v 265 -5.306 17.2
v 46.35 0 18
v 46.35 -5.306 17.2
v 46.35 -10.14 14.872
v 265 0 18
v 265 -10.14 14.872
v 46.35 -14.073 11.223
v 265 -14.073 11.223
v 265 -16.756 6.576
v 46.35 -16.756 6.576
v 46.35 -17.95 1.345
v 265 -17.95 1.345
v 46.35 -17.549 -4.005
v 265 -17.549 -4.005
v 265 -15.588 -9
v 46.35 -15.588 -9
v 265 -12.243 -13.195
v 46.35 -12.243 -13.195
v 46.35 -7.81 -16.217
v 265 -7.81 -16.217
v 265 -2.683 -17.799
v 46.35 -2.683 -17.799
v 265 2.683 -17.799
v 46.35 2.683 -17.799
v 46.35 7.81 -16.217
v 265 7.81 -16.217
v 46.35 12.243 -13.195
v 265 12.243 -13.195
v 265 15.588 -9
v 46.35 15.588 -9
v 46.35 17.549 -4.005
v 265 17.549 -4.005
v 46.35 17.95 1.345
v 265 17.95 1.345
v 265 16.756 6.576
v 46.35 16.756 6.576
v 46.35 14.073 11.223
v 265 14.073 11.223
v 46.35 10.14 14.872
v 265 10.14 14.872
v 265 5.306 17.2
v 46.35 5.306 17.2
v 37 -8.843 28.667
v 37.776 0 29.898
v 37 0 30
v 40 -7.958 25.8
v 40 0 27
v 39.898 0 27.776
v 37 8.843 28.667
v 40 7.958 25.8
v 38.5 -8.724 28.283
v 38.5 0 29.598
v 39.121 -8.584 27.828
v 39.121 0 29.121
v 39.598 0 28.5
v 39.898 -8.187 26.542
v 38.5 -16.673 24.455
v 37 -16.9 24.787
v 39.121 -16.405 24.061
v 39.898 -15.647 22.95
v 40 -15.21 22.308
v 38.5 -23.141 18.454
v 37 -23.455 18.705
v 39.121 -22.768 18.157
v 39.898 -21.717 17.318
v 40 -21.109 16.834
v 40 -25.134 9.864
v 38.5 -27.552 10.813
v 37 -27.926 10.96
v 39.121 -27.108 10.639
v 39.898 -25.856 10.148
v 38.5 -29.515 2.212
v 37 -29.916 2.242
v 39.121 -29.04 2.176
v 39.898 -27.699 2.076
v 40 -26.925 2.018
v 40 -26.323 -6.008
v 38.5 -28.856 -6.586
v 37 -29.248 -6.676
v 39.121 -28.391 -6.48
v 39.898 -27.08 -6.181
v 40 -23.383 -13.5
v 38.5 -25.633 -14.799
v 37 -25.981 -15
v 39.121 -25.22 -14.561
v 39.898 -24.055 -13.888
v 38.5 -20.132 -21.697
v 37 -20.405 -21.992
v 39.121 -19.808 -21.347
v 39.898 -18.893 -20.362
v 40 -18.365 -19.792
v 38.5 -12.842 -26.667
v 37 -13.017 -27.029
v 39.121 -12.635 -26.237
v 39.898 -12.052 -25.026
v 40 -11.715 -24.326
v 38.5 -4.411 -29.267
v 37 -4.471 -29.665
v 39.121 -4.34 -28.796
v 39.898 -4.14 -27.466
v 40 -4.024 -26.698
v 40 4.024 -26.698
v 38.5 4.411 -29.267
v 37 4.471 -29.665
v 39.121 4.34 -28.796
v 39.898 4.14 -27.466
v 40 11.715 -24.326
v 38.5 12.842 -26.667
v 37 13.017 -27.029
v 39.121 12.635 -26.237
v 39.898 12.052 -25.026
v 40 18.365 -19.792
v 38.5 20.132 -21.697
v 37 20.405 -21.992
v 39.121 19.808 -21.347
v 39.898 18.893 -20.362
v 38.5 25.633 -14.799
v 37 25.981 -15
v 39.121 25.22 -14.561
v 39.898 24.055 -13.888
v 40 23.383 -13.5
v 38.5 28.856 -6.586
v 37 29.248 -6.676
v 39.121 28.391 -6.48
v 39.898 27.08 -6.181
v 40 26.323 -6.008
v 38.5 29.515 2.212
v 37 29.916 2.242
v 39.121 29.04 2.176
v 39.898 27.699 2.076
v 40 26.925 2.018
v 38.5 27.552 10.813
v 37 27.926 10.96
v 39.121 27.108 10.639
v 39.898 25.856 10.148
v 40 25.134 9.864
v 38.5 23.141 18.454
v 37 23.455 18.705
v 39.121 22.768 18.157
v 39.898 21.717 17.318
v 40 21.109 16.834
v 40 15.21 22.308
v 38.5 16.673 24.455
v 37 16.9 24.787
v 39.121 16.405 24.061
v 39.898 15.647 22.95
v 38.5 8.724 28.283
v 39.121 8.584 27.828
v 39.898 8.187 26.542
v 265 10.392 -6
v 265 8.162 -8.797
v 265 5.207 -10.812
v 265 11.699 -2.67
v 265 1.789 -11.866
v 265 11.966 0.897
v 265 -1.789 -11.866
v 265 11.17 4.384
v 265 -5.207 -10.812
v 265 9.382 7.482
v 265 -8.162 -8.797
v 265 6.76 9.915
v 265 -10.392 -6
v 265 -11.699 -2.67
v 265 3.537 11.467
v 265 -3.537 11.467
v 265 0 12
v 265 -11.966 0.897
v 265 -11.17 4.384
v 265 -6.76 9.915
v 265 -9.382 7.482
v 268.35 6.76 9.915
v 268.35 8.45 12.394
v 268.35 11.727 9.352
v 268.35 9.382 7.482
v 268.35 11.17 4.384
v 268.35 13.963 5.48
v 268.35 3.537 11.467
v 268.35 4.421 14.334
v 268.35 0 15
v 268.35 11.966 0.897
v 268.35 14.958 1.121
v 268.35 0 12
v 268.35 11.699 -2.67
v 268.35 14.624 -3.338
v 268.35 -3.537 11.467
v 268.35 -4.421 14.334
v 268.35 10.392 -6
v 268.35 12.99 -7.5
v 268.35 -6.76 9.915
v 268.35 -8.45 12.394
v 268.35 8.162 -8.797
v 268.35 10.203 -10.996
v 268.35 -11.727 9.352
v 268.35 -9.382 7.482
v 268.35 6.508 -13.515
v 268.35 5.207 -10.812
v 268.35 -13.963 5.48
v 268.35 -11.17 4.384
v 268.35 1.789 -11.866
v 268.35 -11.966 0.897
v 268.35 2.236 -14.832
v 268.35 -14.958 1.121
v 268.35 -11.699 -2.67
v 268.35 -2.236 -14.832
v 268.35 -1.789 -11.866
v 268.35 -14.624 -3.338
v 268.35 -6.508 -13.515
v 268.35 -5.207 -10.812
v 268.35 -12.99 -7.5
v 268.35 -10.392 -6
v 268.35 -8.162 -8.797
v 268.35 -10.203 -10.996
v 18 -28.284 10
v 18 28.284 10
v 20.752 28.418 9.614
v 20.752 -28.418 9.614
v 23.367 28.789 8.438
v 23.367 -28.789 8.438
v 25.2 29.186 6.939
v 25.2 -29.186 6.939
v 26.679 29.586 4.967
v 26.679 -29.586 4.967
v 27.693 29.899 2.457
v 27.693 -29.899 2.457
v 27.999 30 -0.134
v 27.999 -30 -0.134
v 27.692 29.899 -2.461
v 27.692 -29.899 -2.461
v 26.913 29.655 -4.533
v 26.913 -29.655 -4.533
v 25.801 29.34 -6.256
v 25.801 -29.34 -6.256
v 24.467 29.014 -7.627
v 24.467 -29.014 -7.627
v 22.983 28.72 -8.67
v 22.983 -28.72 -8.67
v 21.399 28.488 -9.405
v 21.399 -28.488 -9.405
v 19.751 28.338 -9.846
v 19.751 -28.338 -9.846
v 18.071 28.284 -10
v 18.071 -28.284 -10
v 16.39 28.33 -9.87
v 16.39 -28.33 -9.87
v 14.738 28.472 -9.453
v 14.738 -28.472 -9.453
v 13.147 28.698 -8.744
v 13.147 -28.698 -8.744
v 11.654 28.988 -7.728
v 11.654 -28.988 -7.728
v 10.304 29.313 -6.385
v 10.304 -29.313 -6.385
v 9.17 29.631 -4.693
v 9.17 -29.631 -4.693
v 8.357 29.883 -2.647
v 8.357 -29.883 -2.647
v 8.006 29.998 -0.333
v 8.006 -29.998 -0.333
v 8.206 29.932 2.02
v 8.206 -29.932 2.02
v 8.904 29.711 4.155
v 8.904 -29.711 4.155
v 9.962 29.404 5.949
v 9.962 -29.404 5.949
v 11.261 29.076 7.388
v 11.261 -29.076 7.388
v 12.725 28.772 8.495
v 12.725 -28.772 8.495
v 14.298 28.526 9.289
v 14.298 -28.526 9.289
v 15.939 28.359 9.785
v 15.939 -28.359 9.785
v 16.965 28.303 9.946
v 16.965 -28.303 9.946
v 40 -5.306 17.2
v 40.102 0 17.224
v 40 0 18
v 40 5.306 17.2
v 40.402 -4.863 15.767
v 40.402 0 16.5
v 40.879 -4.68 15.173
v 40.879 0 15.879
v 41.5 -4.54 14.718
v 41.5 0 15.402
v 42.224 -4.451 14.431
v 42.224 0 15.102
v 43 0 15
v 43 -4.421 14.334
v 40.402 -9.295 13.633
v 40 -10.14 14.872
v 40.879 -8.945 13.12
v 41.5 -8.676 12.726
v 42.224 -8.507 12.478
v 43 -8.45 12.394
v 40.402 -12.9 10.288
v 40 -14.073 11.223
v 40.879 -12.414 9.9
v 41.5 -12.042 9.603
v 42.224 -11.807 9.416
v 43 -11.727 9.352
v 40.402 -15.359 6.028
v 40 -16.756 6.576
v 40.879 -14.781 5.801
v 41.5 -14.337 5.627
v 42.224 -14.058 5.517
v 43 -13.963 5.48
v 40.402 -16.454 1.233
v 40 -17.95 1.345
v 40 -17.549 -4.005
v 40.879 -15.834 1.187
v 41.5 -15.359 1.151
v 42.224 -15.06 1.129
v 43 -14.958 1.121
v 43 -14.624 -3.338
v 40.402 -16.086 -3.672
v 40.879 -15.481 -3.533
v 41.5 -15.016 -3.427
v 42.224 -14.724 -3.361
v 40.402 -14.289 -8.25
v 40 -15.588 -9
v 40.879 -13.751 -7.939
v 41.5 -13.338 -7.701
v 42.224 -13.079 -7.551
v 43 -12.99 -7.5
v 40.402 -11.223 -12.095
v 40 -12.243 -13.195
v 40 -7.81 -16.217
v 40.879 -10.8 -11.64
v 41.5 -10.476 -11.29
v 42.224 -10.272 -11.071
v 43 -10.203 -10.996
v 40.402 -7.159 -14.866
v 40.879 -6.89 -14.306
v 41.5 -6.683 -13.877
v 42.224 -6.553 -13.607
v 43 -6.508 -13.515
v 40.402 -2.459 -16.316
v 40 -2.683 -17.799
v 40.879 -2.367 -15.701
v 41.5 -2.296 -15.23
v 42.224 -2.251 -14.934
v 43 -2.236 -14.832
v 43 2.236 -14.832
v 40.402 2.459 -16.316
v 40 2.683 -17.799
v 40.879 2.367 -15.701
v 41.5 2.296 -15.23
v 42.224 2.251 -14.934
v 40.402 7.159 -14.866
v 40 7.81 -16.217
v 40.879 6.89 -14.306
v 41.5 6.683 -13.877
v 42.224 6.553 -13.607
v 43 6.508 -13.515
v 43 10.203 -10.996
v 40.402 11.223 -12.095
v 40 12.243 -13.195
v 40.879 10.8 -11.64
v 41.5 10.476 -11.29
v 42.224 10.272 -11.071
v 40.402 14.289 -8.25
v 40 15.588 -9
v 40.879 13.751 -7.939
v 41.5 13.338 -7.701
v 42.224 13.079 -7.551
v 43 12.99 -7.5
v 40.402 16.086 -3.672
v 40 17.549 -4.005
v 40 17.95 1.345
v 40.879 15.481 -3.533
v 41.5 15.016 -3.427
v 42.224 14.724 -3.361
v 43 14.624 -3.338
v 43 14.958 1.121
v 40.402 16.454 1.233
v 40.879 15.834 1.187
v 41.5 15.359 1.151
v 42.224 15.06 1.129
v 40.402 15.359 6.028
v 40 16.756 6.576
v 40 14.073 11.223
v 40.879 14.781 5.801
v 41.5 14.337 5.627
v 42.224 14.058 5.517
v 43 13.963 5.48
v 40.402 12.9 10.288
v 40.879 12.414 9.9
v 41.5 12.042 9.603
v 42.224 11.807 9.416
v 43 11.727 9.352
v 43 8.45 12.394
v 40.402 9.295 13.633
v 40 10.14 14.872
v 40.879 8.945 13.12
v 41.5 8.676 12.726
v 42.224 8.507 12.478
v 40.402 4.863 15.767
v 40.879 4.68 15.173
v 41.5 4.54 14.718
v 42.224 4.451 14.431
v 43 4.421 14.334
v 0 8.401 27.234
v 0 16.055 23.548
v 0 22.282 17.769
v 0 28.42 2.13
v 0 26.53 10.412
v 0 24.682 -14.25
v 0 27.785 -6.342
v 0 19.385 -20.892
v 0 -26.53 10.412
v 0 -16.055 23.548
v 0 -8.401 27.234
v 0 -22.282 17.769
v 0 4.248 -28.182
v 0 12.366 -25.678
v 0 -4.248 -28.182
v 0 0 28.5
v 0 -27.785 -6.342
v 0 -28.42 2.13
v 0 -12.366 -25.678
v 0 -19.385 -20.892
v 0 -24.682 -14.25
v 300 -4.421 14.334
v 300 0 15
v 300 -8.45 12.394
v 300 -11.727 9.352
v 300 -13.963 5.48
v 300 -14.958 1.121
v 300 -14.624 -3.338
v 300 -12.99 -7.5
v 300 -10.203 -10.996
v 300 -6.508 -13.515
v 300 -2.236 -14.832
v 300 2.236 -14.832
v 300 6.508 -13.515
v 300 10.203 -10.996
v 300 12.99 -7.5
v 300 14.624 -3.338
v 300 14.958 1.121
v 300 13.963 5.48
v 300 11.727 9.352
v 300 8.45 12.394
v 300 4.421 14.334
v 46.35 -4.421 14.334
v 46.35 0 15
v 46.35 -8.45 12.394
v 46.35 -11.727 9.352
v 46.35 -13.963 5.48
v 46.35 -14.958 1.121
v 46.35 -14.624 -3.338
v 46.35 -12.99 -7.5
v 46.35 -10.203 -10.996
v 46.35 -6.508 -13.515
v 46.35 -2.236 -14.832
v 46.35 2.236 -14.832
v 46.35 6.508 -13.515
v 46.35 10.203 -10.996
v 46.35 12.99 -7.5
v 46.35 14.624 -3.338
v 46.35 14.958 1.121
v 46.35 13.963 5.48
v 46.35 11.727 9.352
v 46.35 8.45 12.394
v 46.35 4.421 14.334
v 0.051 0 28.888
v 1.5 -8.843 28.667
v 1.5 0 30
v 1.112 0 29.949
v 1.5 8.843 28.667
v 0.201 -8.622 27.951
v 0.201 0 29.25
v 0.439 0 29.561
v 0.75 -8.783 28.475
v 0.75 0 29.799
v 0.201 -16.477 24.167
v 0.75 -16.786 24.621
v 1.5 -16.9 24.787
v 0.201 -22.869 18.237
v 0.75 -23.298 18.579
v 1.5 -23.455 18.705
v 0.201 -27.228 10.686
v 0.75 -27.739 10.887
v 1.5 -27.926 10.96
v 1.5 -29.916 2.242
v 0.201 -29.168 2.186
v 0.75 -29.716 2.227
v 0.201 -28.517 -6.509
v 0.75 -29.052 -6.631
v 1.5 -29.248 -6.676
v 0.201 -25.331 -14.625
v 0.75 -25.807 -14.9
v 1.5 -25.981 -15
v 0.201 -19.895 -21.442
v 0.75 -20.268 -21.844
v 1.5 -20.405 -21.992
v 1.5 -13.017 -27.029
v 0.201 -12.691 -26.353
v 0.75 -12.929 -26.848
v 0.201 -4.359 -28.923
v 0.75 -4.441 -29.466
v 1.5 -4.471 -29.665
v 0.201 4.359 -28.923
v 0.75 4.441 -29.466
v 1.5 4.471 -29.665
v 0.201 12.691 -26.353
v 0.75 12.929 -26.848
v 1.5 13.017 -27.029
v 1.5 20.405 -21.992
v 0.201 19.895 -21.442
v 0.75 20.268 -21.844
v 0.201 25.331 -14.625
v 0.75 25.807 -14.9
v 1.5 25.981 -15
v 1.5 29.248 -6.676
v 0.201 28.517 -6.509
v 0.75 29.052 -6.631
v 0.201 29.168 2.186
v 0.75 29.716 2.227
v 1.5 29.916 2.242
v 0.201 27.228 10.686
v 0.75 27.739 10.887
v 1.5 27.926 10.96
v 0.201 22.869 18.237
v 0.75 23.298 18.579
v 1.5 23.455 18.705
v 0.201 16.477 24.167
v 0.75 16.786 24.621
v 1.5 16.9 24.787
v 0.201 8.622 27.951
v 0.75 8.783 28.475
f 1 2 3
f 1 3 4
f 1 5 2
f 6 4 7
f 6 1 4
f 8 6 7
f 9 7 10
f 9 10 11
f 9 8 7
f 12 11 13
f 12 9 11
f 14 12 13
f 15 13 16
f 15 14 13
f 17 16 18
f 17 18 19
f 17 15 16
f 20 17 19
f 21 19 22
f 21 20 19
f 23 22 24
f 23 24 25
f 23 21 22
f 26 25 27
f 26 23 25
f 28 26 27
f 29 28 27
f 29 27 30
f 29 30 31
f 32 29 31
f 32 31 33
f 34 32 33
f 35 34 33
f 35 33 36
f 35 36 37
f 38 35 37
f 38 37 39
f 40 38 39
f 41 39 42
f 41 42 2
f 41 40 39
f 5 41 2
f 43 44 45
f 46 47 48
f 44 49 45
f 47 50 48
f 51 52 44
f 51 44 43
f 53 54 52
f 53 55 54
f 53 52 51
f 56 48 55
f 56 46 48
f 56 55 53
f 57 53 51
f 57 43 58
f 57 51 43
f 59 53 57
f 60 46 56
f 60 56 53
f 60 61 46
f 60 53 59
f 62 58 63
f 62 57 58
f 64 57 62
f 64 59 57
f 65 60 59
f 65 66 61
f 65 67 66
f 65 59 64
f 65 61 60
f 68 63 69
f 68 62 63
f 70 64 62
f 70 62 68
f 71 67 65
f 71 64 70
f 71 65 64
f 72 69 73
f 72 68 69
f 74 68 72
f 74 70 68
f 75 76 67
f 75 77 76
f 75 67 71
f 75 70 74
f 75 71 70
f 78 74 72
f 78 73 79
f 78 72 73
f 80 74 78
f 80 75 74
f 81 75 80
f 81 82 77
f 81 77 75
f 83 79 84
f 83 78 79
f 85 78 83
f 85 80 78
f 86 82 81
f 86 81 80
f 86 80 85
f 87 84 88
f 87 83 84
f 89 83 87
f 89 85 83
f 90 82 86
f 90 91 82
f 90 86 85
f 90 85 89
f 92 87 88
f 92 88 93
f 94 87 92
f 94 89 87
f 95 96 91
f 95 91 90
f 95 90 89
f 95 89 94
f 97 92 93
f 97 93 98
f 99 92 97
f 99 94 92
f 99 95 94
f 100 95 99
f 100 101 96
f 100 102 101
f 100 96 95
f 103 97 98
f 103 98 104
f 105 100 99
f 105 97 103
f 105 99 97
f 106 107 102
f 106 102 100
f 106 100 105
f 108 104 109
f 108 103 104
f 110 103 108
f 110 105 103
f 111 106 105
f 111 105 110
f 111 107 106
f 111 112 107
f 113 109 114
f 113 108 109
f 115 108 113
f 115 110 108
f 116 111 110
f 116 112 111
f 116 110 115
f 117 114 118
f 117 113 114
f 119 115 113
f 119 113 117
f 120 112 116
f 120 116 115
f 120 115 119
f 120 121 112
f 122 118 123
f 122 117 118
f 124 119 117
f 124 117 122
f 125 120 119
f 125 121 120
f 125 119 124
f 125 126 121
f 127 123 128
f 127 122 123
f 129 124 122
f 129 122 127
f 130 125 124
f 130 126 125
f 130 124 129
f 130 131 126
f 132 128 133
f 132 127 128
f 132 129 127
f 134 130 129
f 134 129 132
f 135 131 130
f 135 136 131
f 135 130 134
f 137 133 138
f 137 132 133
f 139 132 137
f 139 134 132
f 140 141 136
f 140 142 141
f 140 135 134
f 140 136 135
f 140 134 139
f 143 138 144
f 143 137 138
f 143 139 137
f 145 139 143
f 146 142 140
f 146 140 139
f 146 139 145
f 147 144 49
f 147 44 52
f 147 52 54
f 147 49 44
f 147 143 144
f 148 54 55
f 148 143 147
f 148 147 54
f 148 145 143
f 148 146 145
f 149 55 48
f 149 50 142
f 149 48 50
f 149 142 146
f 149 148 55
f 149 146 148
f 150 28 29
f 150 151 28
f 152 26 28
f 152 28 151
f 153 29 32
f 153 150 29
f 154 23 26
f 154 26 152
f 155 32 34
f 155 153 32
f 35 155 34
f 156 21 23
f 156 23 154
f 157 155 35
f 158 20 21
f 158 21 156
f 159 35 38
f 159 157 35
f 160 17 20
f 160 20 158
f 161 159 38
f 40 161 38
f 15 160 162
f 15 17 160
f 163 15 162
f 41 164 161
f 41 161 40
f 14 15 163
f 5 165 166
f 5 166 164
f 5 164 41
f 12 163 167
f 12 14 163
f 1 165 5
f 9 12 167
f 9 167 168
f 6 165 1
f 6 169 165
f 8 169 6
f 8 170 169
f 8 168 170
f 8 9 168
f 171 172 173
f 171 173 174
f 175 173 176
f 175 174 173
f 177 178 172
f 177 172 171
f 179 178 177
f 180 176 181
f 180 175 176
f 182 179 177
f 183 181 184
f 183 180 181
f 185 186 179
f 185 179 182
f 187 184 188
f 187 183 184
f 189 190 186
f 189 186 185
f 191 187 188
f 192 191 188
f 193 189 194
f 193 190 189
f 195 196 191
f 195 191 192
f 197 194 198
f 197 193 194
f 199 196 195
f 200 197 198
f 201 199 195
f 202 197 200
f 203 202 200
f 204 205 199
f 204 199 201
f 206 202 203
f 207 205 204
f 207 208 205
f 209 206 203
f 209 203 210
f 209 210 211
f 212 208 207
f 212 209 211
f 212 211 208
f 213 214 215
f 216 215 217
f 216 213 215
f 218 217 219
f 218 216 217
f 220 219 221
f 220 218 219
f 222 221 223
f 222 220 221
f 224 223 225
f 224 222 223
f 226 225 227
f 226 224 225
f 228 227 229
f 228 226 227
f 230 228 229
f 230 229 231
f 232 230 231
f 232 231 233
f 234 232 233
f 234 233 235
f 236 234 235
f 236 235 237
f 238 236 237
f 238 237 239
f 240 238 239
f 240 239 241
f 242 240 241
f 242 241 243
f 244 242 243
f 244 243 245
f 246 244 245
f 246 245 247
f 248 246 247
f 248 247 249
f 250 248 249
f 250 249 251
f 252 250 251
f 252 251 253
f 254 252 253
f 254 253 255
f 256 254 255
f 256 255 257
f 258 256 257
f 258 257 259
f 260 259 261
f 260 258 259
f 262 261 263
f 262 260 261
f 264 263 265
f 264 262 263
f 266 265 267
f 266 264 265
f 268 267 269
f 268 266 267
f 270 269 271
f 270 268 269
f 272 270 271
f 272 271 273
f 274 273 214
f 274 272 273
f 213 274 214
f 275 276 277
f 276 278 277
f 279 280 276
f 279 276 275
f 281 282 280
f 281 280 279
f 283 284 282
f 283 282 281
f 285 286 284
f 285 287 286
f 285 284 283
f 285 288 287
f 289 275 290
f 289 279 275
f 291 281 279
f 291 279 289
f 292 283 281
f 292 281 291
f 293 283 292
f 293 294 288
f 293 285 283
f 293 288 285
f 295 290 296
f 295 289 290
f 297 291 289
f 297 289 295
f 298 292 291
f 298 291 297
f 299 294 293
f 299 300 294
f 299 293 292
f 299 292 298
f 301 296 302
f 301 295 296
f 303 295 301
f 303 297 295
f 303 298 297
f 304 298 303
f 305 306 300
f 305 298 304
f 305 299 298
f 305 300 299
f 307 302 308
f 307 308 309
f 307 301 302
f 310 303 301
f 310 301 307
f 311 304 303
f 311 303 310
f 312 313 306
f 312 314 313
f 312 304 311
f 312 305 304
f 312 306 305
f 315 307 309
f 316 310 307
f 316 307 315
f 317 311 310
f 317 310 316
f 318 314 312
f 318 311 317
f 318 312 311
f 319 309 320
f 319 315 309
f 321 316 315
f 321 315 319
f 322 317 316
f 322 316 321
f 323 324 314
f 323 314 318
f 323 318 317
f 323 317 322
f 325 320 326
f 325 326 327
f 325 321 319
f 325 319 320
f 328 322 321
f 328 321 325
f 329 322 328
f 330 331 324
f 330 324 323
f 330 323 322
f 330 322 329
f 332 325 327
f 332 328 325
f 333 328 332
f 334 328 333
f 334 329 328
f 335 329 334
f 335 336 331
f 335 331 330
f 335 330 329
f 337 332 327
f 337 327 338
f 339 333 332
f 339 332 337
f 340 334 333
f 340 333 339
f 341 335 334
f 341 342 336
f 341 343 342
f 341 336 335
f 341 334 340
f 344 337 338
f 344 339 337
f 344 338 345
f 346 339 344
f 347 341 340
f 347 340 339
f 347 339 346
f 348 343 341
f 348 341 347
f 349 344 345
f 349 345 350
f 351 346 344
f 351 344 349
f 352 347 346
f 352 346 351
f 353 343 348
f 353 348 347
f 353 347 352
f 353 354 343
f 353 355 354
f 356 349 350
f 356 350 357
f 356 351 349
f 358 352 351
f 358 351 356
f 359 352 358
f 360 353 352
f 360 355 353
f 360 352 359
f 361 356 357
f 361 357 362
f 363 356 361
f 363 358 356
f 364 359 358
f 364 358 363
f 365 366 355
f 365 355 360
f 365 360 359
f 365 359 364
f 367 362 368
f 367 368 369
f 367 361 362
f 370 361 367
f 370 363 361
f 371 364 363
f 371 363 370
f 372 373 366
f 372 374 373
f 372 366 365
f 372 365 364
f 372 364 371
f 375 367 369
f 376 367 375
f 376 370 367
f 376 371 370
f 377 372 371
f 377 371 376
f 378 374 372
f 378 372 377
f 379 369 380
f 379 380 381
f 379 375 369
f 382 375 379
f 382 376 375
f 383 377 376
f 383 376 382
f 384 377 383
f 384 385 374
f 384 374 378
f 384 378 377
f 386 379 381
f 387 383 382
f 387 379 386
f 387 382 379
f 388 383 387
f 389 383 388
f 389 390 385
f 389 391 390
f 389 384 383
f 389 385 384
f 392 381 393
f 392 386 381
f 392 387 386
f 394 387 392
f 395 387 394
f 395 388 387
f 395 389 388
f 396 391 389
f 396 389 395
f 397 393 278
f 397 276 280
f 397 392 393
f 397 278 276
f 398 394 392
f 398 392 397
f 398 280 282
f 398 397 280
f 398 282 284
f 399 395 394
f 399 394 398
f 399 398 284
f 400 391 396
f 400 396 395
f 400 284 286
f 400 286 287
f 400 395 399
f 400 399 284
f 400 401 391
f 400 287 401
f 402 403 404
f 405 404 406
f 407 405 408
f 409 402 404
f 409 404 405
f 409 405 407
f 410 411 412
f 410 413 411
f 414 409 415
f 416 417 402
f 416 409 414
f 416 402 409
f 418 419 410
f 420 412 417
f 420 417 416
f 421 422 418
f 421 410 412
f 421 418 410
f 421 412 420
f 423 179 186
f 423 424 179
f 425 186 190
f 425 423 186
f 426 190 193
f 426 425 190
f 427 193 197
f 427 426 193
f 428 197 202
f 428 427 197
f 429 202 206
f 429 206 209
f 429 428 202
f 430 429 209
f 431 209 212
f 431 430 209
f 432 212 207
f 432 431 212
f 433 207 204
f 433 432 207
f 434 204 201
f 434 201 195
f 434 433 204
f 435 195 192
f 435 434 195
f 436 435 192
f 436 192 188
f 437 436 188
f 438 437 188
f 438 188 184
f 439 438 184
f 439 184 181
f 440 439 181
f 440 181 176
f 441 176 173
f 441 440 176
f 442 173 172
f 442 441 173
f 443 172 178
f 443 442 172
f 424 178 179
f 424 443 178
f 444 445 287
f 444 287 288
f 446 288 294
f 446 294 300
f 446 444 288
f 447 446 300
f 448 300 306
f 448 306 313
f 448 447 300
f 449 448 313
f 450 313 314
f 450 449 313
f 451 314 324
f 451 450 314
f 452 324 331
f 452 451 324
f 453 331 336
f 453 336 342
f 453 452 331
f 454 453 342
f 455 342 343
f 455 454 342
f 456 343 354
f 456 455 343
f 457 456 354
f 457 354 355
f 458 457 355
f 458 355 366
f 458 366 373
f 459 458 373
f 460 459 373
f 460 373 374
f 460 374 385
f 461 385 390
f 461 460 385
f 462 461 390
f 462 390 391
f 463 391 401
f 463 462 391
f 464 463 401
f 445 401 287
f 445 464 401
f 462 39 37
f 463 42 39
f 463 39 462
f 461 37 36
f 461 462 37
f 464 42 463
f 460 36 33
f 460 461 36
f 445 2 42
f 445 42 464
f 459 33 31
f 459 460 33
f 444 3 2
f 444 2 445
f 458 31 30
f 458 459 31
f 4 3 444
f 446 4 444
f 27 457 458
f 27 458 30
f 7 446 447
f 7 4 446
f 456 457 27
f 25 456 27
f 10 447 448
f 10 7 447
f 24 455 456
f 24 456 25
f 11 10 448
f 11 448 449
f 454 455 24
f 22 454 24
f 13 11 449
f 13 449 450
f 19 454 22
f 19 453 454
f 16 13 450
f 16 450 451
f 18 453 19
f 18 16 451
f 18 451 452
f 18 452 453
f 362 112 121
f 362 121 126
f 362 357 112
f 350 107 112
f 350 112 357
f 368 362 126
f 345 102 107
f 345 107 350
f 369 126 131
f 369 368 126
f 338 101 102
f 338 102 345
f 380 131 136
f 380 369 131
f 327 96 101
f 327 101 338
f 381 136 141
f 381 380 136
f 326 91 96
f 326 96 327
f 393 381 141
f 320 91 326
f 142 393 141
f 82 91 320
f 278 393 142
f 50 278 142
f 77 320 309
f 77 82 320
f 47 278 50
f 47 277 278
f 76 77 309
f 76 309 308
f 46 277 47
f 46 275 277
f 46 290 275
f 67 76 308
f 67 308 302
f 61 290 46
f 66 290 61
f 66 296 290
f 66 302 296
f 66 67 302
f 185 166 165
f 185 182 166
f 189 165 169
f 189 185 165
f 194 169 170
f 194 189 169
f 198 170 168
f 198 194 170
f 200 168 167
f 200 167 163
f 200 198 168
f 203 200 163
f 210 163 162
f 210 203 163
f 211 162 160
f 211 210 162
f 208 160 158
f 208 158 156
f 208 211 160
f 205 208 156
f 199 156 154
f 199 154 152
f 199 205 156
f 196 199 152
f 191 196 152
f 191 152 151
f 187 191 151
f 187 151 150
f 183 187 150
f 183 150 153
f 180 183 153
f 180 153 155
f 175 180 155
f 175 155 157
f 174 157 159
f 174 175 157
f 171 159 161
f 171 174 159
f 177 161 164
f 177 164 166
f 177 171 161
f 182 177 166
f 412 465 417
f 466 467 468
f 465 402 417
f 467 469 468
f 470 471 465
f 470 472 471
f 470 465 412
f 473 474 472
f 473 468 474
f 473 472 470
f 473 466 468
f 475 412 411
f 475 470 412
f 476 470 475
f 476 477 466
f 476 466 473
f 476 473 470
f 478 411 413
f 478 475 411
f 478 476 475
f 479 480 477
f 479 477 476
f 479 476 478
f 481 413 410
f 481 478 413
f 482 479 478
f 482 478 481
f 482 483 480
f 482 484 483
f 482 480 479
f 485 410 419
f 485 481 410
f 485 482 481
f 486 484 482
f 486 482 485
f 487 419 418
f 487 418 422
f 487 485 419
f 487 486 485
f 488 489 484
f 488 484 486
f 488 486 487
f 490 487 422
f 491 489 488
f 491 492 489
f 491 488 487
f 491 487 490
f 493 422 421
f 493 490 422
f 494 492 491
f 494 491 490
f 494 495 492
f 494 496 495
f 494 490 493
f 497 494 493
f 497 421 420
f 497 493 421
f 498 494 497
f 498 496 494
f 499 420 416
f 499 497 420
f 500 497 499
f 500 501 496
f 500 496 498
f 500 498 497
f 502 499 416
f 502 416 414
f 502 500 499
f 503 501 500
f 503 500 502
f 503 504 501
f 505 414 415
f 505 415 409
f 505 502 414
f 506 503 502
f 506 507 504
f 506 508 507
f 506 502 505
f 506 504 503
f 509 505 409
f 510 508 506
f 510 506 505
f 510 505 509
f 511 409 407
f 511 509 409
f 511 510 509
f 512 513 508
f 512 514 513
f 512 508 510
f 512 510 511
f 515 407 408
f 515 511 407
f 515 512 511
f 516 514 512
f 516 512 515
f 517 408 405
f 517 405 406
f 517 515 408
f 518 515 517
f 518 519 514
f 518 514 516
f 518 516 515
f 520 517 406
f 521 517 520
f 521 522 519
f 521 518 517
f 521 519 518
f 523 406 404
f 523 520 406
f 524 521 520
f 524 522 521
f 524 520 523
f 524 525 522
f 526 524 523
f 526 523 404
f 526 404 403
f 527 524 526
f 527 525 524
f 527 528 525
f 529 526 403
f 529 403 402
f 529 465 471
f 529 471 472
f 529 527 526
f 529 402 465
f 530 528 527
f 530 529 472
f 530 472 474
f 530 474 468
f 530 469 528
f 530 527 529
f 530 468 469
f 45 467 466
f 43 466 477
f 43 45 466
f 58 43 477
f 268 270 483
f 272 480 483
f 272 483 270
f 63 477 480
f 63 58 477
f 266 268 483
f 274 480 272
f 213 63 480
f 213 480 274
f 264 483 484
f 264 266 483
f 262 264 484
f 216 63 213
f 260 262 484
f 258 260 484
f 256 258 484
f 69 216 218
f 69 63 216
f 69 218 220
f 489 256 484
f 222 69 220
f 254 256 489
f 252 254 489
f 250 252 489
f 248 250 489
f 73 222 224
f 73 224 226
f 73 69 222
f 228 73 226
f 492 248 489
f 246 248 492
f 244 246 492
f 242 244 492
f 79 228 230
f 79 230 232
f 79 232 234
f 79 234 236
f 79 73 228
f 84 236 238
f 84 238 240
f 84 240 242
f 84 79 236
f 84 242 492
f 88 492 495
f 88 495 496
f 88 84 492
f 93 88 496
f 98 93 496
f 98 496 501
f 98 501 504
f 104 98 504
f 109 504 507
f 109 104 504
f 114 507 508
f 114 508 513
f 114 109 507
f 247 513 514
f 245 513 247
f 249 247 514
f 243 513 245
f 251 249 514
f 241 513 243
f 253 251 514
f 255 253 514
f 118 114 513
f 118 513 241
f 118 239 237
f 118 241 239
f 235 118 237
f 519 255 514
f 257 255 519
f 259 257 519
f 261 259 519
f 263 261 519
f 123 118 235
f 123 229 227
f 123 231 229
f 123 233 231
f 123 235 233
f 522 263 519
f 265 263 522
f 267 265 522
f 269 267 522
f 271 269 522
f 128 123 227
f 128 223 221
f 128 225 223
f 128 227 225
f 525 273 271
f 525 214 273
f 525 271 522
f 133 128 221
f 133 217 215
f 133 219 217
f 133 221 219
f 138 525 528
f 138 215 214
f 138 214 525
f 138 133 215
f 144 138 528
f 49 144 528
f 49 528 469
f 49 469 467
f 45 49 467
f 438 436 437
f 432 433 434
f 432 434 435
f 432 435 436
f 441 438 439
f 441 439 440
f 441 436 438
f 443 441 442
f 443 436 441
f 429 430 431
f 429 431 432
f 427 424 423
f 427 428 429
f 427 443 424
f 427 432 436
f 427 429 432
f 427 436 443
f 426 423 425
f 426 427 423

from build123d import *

# Parameters (mm, degrees)
FILLET1_R               = 1.5
CUT_EXTRUDE1_DEPTH      = 303.985148161
CUT_EXTRUDE1_DEPTH_BACK = 303.985148161
SKETCH2_R               = 10
FILLET2_R               = 3


with BuildPart() as part:
    # Sketch1 → Revolve1 (revolve)
    with BuildSketch(Plane.XY, mode=Mode.PRIVATE) as revolve1_sk:
        Polygon((0, 0), (0, 30), (40, 30), (40, 15), (46.35, 15), (46.35, 18), (265, 18), (265, 12), (268.35, 12), (268.35, 15), (300, 15), (300, 0), align=None)
    revolve(revolve1_sk.sketch.rotate(Axis((0, 0, 0), (1, 0, 0)), 90), axis=Axis((0, 0, 0), (1, 0, 0)))

    # Fillet1
    fillet1_edges = [part.edges().sort_by_distance(p)[0] for p in [
        (0, 0, -30),
    ]]
    fillet(fillet1_edges, radius=FILLET1_R)

    # Sketch2 → Cut-Extrude1 (cut, two sides: drawn at the far end of the back side and taken through both)
    with BuildSketch(Plane(origin=(0, 0, 0), x_dir=(1, 0, 0), z_dir=(0, 1, 0)).offset(-CUT_EXTRUDE1_DEPTH_BACK)):
        with Locations(Location((18, 0, 0), (0, 0, 270))):
            Circle(SKETCH2_R)
    extrude(amount=CUT_EXTRUDE1_DEPTH + CUT_EXTRUDE1_DEPTH_BACK, mode=Mode.SUBTRACT)

    # Fillet2
    fillet2_edges = [part.edges().sort_by_distance(p)[0] for p in [
        (40, 0, -15),
        (40, 0, -30),
    ]]
    fillet(fillet2_edges, radius=FILLET2_R)


solid = part.part
